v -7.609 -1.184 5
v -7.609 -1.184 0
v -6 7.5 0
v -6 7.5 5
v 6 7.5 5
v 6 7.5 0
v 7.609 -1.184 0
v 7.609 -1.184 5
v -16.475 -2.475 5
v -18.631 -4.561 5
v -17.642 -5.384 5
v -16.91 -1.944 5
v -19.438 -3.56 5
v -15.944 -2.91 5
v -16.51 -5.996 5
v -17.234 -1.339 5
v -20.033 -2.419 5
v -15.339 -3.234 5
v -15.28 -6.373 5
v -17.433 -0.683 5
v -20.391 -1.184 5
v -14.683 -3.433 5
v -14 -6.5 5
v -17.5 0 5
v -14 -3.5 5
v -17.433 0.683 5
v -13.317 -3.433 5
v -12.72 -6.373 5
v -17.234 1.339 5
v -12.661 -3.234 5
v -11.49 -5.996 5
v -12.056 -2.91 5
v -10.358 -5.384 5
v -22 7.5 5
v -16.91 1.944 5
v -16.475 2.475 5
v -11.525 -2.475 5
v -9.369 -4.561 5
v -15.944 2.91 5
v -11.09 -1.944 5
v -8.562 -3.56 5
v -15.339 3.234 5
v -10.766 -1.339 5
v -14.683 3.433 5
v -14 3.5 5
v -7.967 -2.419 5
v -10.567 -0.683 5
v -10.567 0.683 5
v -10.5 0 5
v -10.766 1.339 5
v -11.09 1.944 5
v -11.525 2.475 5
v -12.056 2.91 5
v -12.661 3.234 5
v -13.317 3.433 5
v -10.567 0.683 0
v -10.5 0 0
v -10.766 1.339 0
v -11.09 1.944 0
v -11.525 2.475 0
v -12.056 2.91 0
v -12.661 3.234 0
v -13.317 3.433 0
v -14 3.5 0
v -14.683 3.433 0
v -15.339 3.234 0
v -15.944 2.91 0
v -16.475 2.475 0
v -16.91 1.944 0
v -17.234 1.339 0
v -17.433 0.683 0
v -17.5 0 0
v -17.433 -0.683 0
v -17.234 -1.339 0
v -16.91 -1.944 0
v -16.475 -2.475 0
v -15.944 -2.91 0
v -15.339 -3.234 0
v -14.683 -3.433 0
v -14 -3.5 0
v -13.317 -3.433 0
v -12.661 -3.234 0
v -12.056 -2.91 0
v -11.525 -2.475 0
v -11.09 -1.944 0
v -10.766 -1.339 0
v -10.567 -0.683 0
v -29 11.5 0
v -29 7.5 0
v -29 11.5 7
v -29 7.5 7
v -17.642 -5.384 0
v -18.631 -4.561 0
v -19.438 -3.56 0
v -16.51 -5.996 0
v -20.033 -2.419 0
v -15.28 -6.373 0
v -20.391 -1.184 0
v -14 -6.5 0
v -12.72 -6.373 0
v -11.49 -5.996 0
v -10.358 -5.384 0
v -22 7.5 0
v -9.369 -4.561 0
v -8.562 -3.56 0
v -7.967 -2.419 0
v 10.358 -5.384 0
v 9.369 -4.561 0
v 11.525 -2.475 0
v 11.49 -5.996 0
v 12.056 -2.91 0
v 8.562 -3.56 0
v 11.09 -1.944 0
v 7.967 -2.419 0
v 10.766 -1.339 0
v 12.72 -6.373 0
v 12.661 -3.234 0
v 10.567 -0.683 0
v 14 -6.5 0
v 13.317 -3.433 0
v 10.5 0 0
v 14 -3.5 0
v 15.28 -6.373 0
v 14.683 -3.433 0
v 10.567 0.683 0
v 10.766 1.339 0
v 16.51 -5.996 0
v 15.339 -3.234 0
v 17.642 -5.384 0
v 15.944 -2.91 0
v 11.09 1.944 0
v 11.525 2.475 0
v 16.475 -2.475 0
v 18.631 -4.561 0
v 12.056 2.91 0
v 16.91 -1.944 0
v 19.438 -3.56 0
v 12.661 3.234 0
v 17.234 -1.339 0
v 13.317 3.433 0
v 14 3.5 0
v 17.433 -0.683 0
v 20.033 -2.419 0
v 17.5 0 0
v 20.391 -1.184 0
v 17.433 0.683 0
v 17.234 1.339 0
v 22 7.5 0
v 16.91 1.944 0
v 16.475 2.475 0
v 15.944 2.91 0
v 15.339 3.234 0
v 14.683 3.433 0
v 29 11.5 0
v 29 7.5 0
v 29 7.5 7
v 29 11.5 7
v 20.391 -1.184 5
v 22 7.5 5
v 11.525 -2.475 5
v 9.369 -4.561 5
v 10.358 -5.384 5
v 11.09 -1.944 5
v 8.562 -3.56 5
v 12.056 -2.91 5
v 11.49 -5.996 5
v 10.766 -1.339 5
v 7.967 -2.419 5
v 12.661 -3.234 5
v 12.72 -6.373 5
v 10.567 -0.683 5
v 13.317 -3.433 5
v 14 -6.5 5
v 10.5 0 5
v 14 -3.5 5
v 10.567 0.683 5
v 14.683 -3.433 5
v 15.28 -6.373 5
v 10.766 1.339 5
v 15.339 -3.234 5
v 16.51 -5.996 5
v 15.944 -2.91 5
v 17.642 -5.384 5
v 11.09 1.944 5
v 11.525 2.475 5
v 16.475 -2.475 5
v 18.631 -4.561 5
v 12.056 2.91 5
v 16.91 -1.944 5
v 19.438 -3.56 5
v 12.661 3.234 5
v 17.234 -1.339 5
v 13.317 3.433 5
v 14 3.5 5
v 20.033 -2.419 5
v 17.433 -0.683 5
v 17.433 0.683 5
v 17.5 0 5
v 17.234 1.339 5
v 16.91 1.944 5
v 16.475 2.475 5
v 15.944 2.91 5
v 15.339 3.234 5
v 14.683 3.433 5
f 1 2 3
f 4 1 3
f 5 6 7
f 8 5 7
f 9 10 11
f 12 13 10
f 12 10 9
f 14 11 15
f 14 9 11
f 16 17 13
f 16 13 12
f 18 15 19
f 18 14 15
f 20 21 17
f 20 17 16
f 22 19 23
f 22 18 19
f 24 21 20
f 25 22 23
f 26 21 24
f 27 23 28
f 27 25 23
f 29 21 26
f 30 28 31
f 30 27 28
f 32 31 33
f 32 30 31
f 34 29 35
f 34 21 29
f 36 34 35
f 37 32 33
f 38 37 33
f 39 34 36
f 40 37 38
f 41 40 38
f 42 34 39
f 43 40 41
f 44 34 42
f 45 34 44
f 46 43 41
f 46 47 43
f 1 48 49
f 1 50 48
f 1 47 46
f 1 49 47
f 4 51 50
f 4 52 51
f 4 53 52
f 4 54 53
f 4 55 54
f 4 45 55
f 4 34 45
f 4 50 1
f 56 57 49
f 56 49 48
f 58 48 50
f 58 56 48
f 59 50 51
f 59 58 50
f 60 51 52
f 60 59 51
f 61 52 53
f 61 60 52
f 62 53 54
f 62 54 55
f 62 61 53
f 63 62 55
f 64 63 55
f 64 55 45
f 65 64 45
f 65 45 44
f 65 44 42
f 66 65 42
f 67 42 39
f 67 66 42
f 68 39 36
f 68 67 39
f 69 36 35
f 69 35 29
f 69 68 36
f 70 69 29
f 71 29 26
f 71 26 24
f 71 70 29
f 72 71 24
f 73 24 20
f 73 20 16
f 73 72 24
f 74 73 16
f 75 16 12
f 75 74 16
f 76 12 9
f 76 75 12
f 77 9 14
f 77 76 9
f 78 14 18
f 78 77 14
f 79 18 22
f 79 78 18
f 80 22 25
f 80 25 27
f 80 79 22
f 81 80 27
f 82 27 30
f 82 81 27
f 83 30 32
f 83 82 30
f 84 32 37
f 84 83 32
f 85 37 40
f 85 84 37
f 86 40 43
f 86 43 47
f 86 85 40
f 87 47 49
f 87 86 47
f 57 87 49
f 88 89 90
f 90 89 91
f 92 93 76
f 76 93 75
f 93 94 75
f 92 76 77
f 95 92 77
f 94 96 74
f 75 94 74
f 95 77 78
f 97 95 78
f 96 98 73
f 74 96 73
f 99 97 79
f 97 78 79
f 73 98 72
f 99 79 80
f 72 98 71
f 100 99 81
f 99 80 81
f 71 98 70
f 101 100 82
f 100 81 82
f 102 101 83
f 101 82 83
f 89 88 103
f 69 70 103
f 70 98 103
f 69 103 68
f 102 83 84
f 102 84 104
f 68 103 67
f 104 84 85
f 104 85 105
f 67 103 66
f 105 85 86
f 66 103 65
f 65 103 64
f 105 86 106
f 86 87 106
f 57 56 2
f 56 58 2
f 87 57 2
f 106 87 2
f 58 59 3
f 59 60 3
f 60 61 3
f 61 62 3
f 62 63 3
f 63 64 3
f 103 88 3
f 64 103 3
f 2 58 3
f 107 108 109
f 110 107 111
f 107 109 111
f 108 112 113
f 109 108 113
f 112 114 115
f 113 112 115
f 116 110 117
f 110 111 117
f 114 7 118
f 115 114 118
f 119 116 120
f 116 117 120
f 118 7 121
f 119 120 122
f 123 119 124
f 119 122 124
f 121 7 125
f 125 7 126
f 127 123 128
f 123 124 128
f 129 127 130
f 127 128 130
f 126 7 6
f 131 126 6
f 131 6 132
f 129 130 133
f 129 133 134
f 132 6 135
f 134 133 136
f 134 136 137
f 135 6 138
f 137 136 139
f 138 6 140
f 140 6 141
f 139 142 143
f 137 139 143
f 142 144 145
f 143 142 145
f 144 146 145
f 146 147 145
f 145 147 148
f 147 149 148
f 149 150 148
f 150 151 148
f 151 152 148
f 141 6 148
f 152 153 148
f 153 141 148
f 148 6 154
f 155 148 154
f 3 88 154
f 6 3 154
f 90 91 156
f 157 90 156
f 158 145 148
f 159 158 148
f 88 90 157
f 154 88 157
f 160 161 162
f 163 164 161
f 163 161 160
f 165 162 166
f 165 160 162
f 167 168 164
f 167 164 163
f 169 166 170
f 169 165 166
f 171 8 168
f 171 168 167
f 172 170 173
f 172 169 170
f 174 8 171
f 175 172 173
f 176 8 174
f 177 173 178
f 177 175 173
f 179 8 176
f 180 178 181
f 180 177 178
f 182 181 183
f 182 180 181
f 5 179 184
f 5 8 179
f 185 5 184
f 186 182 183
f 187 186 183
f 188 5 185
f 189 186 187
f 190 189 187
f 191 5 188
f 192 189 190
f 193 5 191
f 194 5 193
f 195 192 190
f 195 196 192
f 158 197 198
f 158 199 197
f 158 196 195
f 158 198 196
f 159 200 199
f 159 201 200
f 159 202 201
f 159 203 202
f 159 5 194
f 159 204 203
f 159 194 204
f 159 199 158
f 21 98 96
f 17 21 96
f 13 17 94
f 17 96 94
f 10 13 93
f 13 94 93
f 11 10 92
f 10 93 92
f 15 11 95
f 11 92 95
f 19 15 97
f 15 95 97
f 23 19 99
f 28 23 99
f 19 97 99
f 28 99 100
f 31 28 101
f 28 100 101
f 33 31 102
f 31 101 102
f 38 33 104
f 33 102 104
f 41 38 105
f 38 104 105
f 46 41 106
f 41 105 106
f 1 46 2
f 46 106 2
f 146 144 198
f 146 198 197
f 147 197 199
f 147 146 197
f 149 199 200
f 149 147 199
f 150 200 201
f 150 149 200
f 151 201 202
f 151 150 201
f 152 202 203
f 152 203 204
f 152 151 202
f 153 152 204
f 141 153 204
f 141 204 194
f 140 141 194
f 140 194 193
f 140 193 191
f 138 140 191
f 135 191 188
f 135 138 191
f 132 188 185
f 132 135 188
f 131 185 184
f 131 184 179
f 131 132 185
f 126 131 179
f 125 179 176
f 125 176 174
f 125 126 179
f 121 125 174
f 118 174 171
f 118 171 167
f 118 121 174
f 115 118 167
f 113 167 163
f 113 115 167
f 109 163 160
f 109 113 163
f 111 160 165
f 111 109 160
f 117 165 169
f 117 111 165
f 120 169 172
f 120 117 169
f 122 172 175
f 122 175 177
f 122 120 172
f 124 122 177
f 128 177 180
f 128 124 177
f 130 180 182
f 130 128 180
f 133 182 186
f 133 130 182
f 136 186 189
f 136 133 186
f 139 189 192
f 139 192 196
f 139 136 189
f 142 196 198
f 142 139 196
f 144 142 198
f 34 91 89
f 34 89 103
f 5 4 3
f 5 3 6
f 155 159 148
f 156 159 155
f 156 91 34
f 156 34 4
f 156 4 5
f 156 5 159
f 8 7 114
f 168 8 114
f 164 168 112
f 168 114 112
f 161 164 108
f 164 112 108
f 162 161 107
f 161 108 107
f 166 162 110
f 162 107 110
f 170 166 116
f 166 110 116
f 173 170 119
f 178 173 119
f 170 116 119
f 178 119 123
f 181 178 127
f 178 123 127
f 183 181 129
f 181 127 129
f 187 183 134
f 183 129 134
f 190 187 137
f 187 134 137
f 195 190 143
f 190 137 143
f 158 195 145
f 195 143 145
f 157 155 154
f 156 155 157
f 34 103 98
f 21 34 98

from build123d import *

# Parameters (mm, degrees)
SKETCH_1_R      = 3.5
EXTRUDE_1_DEPTH = 5
SKETCH_2_W      = 58
SKETCH_2_H      = 2
EXTRUDE_2_DEPTH = 4


with BuildPart() as part:
    # 草图1 → 凸台-拉伸1 (new body)
    with BuildSketch(Plane.XY):
        with BuildLine():
            Line((-7.608745595, -1.184004699), (-6, 7.5))
            Line((-6, 7.5), (6, 7.5))
            Line((6, 7.5), (7.608745595, -1.184004699))
            ThreePointArc((7.608745595, -1.184004699), (14, -6.5), (20.391254405, -1.184004699))
            Line((20.391254405, -1.184004699), (22, 7.5))
            Line((22, 7.5), (29, 7.5))
            Line((29, 7.5), (29, 11.5))
            Line((29, 11.5), (-29, 11.5))
            Line((-29, 11.5), (-29, 7.5))
            Line((-29, 7.5), (-22, 7.5))
            Line((-22, 7.5), (-20.391254405, -1.184004699))
            ThreePointArc((-20.391254405, -1.184004699), (-14, -6.5), (-7.608745595, -1.184004699))
        make_face()
        with Locations((-14, 0)):
            Circle(SKETCH_1_R, mode=Mode.SUBTRACT)
        with Locations((14, 0)):
            Circle(SKETCH_1_R, mode=Mode.SUBTRACT)
    extrude(amount=EXTRUDE_1_DEPTH)

    # 草图2 → 凸台-拉伸2 (add)
    with BuildSketch(Plane.XZ.offset(-7.5)):
        with Locations((0, 6)):
            Rectangle(SKETCH_2_W, SKETCH_2_H)
    extrude(amount=-EXTRUDE_2_DEPTH)


solid = part.part
